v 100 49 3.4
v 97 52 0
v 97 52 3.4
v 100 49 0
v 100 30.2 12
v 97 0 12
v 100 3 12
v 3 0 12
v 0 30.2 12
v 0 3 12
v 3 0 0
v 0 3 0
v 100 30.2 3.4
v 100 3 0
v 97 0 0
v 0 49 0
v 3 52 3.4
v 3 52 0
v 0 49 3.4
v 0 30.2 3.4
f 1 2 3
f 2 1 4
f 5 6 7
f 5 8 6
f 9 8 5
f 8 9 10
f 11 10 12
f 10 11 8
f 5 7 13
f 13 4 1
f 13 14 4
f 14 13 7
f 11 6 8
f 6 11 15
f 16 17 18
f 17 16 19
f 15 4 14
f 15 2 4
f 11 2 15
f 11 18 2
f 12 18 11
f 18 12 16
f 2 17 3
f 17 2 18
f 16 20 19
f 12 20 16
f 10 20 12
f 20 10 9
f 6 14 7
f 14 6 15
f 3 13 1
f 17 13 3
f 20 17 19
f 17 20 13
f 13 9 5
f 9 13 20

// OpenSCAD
$fn = 32;

// ----------------------------------------------------------------------
// Stepped bar: sidestep, 100 x 52 x 12/3.4 mm
// ----------------------------------------------------------------------

// --- parameters (mm) ---
bar_l = 100;              // bar length, X
bar_w = 52;               // bar width, Y
plate_t = 12;             // thickness of the thick zone, Z
thin_t = 3.4;             // thickness of the thin zone
corner_c = 3;             // corner chamfer of the bar
step_cut = 8.6;           // material removed from the thin zone
ledge_y = 30.2;           // start of the ledge from the front edge
depth_1 = 8.6;            // depth of cut 1 from the top face

profile = [[3, 0], [97, 0], [100, 3], [100, 49], [97, 52], [3, 52], [0, 49], [0, 3]];  // primary outline, 8 points, counter clockwise
void_1 = [[-1, 30.2], [101, 30.2], [101, 53], [-1, 53]];  // ledge cut along one edge, 4 points

// --- the one profile operation ---
difference() {
  linear_extrude(height = plate_t) polygon(points = profile);
  translate([0, 0, plate_t - depth_1])
    linear_extrude(height = depth_1 + 1) polygon(points = void_1);
}
